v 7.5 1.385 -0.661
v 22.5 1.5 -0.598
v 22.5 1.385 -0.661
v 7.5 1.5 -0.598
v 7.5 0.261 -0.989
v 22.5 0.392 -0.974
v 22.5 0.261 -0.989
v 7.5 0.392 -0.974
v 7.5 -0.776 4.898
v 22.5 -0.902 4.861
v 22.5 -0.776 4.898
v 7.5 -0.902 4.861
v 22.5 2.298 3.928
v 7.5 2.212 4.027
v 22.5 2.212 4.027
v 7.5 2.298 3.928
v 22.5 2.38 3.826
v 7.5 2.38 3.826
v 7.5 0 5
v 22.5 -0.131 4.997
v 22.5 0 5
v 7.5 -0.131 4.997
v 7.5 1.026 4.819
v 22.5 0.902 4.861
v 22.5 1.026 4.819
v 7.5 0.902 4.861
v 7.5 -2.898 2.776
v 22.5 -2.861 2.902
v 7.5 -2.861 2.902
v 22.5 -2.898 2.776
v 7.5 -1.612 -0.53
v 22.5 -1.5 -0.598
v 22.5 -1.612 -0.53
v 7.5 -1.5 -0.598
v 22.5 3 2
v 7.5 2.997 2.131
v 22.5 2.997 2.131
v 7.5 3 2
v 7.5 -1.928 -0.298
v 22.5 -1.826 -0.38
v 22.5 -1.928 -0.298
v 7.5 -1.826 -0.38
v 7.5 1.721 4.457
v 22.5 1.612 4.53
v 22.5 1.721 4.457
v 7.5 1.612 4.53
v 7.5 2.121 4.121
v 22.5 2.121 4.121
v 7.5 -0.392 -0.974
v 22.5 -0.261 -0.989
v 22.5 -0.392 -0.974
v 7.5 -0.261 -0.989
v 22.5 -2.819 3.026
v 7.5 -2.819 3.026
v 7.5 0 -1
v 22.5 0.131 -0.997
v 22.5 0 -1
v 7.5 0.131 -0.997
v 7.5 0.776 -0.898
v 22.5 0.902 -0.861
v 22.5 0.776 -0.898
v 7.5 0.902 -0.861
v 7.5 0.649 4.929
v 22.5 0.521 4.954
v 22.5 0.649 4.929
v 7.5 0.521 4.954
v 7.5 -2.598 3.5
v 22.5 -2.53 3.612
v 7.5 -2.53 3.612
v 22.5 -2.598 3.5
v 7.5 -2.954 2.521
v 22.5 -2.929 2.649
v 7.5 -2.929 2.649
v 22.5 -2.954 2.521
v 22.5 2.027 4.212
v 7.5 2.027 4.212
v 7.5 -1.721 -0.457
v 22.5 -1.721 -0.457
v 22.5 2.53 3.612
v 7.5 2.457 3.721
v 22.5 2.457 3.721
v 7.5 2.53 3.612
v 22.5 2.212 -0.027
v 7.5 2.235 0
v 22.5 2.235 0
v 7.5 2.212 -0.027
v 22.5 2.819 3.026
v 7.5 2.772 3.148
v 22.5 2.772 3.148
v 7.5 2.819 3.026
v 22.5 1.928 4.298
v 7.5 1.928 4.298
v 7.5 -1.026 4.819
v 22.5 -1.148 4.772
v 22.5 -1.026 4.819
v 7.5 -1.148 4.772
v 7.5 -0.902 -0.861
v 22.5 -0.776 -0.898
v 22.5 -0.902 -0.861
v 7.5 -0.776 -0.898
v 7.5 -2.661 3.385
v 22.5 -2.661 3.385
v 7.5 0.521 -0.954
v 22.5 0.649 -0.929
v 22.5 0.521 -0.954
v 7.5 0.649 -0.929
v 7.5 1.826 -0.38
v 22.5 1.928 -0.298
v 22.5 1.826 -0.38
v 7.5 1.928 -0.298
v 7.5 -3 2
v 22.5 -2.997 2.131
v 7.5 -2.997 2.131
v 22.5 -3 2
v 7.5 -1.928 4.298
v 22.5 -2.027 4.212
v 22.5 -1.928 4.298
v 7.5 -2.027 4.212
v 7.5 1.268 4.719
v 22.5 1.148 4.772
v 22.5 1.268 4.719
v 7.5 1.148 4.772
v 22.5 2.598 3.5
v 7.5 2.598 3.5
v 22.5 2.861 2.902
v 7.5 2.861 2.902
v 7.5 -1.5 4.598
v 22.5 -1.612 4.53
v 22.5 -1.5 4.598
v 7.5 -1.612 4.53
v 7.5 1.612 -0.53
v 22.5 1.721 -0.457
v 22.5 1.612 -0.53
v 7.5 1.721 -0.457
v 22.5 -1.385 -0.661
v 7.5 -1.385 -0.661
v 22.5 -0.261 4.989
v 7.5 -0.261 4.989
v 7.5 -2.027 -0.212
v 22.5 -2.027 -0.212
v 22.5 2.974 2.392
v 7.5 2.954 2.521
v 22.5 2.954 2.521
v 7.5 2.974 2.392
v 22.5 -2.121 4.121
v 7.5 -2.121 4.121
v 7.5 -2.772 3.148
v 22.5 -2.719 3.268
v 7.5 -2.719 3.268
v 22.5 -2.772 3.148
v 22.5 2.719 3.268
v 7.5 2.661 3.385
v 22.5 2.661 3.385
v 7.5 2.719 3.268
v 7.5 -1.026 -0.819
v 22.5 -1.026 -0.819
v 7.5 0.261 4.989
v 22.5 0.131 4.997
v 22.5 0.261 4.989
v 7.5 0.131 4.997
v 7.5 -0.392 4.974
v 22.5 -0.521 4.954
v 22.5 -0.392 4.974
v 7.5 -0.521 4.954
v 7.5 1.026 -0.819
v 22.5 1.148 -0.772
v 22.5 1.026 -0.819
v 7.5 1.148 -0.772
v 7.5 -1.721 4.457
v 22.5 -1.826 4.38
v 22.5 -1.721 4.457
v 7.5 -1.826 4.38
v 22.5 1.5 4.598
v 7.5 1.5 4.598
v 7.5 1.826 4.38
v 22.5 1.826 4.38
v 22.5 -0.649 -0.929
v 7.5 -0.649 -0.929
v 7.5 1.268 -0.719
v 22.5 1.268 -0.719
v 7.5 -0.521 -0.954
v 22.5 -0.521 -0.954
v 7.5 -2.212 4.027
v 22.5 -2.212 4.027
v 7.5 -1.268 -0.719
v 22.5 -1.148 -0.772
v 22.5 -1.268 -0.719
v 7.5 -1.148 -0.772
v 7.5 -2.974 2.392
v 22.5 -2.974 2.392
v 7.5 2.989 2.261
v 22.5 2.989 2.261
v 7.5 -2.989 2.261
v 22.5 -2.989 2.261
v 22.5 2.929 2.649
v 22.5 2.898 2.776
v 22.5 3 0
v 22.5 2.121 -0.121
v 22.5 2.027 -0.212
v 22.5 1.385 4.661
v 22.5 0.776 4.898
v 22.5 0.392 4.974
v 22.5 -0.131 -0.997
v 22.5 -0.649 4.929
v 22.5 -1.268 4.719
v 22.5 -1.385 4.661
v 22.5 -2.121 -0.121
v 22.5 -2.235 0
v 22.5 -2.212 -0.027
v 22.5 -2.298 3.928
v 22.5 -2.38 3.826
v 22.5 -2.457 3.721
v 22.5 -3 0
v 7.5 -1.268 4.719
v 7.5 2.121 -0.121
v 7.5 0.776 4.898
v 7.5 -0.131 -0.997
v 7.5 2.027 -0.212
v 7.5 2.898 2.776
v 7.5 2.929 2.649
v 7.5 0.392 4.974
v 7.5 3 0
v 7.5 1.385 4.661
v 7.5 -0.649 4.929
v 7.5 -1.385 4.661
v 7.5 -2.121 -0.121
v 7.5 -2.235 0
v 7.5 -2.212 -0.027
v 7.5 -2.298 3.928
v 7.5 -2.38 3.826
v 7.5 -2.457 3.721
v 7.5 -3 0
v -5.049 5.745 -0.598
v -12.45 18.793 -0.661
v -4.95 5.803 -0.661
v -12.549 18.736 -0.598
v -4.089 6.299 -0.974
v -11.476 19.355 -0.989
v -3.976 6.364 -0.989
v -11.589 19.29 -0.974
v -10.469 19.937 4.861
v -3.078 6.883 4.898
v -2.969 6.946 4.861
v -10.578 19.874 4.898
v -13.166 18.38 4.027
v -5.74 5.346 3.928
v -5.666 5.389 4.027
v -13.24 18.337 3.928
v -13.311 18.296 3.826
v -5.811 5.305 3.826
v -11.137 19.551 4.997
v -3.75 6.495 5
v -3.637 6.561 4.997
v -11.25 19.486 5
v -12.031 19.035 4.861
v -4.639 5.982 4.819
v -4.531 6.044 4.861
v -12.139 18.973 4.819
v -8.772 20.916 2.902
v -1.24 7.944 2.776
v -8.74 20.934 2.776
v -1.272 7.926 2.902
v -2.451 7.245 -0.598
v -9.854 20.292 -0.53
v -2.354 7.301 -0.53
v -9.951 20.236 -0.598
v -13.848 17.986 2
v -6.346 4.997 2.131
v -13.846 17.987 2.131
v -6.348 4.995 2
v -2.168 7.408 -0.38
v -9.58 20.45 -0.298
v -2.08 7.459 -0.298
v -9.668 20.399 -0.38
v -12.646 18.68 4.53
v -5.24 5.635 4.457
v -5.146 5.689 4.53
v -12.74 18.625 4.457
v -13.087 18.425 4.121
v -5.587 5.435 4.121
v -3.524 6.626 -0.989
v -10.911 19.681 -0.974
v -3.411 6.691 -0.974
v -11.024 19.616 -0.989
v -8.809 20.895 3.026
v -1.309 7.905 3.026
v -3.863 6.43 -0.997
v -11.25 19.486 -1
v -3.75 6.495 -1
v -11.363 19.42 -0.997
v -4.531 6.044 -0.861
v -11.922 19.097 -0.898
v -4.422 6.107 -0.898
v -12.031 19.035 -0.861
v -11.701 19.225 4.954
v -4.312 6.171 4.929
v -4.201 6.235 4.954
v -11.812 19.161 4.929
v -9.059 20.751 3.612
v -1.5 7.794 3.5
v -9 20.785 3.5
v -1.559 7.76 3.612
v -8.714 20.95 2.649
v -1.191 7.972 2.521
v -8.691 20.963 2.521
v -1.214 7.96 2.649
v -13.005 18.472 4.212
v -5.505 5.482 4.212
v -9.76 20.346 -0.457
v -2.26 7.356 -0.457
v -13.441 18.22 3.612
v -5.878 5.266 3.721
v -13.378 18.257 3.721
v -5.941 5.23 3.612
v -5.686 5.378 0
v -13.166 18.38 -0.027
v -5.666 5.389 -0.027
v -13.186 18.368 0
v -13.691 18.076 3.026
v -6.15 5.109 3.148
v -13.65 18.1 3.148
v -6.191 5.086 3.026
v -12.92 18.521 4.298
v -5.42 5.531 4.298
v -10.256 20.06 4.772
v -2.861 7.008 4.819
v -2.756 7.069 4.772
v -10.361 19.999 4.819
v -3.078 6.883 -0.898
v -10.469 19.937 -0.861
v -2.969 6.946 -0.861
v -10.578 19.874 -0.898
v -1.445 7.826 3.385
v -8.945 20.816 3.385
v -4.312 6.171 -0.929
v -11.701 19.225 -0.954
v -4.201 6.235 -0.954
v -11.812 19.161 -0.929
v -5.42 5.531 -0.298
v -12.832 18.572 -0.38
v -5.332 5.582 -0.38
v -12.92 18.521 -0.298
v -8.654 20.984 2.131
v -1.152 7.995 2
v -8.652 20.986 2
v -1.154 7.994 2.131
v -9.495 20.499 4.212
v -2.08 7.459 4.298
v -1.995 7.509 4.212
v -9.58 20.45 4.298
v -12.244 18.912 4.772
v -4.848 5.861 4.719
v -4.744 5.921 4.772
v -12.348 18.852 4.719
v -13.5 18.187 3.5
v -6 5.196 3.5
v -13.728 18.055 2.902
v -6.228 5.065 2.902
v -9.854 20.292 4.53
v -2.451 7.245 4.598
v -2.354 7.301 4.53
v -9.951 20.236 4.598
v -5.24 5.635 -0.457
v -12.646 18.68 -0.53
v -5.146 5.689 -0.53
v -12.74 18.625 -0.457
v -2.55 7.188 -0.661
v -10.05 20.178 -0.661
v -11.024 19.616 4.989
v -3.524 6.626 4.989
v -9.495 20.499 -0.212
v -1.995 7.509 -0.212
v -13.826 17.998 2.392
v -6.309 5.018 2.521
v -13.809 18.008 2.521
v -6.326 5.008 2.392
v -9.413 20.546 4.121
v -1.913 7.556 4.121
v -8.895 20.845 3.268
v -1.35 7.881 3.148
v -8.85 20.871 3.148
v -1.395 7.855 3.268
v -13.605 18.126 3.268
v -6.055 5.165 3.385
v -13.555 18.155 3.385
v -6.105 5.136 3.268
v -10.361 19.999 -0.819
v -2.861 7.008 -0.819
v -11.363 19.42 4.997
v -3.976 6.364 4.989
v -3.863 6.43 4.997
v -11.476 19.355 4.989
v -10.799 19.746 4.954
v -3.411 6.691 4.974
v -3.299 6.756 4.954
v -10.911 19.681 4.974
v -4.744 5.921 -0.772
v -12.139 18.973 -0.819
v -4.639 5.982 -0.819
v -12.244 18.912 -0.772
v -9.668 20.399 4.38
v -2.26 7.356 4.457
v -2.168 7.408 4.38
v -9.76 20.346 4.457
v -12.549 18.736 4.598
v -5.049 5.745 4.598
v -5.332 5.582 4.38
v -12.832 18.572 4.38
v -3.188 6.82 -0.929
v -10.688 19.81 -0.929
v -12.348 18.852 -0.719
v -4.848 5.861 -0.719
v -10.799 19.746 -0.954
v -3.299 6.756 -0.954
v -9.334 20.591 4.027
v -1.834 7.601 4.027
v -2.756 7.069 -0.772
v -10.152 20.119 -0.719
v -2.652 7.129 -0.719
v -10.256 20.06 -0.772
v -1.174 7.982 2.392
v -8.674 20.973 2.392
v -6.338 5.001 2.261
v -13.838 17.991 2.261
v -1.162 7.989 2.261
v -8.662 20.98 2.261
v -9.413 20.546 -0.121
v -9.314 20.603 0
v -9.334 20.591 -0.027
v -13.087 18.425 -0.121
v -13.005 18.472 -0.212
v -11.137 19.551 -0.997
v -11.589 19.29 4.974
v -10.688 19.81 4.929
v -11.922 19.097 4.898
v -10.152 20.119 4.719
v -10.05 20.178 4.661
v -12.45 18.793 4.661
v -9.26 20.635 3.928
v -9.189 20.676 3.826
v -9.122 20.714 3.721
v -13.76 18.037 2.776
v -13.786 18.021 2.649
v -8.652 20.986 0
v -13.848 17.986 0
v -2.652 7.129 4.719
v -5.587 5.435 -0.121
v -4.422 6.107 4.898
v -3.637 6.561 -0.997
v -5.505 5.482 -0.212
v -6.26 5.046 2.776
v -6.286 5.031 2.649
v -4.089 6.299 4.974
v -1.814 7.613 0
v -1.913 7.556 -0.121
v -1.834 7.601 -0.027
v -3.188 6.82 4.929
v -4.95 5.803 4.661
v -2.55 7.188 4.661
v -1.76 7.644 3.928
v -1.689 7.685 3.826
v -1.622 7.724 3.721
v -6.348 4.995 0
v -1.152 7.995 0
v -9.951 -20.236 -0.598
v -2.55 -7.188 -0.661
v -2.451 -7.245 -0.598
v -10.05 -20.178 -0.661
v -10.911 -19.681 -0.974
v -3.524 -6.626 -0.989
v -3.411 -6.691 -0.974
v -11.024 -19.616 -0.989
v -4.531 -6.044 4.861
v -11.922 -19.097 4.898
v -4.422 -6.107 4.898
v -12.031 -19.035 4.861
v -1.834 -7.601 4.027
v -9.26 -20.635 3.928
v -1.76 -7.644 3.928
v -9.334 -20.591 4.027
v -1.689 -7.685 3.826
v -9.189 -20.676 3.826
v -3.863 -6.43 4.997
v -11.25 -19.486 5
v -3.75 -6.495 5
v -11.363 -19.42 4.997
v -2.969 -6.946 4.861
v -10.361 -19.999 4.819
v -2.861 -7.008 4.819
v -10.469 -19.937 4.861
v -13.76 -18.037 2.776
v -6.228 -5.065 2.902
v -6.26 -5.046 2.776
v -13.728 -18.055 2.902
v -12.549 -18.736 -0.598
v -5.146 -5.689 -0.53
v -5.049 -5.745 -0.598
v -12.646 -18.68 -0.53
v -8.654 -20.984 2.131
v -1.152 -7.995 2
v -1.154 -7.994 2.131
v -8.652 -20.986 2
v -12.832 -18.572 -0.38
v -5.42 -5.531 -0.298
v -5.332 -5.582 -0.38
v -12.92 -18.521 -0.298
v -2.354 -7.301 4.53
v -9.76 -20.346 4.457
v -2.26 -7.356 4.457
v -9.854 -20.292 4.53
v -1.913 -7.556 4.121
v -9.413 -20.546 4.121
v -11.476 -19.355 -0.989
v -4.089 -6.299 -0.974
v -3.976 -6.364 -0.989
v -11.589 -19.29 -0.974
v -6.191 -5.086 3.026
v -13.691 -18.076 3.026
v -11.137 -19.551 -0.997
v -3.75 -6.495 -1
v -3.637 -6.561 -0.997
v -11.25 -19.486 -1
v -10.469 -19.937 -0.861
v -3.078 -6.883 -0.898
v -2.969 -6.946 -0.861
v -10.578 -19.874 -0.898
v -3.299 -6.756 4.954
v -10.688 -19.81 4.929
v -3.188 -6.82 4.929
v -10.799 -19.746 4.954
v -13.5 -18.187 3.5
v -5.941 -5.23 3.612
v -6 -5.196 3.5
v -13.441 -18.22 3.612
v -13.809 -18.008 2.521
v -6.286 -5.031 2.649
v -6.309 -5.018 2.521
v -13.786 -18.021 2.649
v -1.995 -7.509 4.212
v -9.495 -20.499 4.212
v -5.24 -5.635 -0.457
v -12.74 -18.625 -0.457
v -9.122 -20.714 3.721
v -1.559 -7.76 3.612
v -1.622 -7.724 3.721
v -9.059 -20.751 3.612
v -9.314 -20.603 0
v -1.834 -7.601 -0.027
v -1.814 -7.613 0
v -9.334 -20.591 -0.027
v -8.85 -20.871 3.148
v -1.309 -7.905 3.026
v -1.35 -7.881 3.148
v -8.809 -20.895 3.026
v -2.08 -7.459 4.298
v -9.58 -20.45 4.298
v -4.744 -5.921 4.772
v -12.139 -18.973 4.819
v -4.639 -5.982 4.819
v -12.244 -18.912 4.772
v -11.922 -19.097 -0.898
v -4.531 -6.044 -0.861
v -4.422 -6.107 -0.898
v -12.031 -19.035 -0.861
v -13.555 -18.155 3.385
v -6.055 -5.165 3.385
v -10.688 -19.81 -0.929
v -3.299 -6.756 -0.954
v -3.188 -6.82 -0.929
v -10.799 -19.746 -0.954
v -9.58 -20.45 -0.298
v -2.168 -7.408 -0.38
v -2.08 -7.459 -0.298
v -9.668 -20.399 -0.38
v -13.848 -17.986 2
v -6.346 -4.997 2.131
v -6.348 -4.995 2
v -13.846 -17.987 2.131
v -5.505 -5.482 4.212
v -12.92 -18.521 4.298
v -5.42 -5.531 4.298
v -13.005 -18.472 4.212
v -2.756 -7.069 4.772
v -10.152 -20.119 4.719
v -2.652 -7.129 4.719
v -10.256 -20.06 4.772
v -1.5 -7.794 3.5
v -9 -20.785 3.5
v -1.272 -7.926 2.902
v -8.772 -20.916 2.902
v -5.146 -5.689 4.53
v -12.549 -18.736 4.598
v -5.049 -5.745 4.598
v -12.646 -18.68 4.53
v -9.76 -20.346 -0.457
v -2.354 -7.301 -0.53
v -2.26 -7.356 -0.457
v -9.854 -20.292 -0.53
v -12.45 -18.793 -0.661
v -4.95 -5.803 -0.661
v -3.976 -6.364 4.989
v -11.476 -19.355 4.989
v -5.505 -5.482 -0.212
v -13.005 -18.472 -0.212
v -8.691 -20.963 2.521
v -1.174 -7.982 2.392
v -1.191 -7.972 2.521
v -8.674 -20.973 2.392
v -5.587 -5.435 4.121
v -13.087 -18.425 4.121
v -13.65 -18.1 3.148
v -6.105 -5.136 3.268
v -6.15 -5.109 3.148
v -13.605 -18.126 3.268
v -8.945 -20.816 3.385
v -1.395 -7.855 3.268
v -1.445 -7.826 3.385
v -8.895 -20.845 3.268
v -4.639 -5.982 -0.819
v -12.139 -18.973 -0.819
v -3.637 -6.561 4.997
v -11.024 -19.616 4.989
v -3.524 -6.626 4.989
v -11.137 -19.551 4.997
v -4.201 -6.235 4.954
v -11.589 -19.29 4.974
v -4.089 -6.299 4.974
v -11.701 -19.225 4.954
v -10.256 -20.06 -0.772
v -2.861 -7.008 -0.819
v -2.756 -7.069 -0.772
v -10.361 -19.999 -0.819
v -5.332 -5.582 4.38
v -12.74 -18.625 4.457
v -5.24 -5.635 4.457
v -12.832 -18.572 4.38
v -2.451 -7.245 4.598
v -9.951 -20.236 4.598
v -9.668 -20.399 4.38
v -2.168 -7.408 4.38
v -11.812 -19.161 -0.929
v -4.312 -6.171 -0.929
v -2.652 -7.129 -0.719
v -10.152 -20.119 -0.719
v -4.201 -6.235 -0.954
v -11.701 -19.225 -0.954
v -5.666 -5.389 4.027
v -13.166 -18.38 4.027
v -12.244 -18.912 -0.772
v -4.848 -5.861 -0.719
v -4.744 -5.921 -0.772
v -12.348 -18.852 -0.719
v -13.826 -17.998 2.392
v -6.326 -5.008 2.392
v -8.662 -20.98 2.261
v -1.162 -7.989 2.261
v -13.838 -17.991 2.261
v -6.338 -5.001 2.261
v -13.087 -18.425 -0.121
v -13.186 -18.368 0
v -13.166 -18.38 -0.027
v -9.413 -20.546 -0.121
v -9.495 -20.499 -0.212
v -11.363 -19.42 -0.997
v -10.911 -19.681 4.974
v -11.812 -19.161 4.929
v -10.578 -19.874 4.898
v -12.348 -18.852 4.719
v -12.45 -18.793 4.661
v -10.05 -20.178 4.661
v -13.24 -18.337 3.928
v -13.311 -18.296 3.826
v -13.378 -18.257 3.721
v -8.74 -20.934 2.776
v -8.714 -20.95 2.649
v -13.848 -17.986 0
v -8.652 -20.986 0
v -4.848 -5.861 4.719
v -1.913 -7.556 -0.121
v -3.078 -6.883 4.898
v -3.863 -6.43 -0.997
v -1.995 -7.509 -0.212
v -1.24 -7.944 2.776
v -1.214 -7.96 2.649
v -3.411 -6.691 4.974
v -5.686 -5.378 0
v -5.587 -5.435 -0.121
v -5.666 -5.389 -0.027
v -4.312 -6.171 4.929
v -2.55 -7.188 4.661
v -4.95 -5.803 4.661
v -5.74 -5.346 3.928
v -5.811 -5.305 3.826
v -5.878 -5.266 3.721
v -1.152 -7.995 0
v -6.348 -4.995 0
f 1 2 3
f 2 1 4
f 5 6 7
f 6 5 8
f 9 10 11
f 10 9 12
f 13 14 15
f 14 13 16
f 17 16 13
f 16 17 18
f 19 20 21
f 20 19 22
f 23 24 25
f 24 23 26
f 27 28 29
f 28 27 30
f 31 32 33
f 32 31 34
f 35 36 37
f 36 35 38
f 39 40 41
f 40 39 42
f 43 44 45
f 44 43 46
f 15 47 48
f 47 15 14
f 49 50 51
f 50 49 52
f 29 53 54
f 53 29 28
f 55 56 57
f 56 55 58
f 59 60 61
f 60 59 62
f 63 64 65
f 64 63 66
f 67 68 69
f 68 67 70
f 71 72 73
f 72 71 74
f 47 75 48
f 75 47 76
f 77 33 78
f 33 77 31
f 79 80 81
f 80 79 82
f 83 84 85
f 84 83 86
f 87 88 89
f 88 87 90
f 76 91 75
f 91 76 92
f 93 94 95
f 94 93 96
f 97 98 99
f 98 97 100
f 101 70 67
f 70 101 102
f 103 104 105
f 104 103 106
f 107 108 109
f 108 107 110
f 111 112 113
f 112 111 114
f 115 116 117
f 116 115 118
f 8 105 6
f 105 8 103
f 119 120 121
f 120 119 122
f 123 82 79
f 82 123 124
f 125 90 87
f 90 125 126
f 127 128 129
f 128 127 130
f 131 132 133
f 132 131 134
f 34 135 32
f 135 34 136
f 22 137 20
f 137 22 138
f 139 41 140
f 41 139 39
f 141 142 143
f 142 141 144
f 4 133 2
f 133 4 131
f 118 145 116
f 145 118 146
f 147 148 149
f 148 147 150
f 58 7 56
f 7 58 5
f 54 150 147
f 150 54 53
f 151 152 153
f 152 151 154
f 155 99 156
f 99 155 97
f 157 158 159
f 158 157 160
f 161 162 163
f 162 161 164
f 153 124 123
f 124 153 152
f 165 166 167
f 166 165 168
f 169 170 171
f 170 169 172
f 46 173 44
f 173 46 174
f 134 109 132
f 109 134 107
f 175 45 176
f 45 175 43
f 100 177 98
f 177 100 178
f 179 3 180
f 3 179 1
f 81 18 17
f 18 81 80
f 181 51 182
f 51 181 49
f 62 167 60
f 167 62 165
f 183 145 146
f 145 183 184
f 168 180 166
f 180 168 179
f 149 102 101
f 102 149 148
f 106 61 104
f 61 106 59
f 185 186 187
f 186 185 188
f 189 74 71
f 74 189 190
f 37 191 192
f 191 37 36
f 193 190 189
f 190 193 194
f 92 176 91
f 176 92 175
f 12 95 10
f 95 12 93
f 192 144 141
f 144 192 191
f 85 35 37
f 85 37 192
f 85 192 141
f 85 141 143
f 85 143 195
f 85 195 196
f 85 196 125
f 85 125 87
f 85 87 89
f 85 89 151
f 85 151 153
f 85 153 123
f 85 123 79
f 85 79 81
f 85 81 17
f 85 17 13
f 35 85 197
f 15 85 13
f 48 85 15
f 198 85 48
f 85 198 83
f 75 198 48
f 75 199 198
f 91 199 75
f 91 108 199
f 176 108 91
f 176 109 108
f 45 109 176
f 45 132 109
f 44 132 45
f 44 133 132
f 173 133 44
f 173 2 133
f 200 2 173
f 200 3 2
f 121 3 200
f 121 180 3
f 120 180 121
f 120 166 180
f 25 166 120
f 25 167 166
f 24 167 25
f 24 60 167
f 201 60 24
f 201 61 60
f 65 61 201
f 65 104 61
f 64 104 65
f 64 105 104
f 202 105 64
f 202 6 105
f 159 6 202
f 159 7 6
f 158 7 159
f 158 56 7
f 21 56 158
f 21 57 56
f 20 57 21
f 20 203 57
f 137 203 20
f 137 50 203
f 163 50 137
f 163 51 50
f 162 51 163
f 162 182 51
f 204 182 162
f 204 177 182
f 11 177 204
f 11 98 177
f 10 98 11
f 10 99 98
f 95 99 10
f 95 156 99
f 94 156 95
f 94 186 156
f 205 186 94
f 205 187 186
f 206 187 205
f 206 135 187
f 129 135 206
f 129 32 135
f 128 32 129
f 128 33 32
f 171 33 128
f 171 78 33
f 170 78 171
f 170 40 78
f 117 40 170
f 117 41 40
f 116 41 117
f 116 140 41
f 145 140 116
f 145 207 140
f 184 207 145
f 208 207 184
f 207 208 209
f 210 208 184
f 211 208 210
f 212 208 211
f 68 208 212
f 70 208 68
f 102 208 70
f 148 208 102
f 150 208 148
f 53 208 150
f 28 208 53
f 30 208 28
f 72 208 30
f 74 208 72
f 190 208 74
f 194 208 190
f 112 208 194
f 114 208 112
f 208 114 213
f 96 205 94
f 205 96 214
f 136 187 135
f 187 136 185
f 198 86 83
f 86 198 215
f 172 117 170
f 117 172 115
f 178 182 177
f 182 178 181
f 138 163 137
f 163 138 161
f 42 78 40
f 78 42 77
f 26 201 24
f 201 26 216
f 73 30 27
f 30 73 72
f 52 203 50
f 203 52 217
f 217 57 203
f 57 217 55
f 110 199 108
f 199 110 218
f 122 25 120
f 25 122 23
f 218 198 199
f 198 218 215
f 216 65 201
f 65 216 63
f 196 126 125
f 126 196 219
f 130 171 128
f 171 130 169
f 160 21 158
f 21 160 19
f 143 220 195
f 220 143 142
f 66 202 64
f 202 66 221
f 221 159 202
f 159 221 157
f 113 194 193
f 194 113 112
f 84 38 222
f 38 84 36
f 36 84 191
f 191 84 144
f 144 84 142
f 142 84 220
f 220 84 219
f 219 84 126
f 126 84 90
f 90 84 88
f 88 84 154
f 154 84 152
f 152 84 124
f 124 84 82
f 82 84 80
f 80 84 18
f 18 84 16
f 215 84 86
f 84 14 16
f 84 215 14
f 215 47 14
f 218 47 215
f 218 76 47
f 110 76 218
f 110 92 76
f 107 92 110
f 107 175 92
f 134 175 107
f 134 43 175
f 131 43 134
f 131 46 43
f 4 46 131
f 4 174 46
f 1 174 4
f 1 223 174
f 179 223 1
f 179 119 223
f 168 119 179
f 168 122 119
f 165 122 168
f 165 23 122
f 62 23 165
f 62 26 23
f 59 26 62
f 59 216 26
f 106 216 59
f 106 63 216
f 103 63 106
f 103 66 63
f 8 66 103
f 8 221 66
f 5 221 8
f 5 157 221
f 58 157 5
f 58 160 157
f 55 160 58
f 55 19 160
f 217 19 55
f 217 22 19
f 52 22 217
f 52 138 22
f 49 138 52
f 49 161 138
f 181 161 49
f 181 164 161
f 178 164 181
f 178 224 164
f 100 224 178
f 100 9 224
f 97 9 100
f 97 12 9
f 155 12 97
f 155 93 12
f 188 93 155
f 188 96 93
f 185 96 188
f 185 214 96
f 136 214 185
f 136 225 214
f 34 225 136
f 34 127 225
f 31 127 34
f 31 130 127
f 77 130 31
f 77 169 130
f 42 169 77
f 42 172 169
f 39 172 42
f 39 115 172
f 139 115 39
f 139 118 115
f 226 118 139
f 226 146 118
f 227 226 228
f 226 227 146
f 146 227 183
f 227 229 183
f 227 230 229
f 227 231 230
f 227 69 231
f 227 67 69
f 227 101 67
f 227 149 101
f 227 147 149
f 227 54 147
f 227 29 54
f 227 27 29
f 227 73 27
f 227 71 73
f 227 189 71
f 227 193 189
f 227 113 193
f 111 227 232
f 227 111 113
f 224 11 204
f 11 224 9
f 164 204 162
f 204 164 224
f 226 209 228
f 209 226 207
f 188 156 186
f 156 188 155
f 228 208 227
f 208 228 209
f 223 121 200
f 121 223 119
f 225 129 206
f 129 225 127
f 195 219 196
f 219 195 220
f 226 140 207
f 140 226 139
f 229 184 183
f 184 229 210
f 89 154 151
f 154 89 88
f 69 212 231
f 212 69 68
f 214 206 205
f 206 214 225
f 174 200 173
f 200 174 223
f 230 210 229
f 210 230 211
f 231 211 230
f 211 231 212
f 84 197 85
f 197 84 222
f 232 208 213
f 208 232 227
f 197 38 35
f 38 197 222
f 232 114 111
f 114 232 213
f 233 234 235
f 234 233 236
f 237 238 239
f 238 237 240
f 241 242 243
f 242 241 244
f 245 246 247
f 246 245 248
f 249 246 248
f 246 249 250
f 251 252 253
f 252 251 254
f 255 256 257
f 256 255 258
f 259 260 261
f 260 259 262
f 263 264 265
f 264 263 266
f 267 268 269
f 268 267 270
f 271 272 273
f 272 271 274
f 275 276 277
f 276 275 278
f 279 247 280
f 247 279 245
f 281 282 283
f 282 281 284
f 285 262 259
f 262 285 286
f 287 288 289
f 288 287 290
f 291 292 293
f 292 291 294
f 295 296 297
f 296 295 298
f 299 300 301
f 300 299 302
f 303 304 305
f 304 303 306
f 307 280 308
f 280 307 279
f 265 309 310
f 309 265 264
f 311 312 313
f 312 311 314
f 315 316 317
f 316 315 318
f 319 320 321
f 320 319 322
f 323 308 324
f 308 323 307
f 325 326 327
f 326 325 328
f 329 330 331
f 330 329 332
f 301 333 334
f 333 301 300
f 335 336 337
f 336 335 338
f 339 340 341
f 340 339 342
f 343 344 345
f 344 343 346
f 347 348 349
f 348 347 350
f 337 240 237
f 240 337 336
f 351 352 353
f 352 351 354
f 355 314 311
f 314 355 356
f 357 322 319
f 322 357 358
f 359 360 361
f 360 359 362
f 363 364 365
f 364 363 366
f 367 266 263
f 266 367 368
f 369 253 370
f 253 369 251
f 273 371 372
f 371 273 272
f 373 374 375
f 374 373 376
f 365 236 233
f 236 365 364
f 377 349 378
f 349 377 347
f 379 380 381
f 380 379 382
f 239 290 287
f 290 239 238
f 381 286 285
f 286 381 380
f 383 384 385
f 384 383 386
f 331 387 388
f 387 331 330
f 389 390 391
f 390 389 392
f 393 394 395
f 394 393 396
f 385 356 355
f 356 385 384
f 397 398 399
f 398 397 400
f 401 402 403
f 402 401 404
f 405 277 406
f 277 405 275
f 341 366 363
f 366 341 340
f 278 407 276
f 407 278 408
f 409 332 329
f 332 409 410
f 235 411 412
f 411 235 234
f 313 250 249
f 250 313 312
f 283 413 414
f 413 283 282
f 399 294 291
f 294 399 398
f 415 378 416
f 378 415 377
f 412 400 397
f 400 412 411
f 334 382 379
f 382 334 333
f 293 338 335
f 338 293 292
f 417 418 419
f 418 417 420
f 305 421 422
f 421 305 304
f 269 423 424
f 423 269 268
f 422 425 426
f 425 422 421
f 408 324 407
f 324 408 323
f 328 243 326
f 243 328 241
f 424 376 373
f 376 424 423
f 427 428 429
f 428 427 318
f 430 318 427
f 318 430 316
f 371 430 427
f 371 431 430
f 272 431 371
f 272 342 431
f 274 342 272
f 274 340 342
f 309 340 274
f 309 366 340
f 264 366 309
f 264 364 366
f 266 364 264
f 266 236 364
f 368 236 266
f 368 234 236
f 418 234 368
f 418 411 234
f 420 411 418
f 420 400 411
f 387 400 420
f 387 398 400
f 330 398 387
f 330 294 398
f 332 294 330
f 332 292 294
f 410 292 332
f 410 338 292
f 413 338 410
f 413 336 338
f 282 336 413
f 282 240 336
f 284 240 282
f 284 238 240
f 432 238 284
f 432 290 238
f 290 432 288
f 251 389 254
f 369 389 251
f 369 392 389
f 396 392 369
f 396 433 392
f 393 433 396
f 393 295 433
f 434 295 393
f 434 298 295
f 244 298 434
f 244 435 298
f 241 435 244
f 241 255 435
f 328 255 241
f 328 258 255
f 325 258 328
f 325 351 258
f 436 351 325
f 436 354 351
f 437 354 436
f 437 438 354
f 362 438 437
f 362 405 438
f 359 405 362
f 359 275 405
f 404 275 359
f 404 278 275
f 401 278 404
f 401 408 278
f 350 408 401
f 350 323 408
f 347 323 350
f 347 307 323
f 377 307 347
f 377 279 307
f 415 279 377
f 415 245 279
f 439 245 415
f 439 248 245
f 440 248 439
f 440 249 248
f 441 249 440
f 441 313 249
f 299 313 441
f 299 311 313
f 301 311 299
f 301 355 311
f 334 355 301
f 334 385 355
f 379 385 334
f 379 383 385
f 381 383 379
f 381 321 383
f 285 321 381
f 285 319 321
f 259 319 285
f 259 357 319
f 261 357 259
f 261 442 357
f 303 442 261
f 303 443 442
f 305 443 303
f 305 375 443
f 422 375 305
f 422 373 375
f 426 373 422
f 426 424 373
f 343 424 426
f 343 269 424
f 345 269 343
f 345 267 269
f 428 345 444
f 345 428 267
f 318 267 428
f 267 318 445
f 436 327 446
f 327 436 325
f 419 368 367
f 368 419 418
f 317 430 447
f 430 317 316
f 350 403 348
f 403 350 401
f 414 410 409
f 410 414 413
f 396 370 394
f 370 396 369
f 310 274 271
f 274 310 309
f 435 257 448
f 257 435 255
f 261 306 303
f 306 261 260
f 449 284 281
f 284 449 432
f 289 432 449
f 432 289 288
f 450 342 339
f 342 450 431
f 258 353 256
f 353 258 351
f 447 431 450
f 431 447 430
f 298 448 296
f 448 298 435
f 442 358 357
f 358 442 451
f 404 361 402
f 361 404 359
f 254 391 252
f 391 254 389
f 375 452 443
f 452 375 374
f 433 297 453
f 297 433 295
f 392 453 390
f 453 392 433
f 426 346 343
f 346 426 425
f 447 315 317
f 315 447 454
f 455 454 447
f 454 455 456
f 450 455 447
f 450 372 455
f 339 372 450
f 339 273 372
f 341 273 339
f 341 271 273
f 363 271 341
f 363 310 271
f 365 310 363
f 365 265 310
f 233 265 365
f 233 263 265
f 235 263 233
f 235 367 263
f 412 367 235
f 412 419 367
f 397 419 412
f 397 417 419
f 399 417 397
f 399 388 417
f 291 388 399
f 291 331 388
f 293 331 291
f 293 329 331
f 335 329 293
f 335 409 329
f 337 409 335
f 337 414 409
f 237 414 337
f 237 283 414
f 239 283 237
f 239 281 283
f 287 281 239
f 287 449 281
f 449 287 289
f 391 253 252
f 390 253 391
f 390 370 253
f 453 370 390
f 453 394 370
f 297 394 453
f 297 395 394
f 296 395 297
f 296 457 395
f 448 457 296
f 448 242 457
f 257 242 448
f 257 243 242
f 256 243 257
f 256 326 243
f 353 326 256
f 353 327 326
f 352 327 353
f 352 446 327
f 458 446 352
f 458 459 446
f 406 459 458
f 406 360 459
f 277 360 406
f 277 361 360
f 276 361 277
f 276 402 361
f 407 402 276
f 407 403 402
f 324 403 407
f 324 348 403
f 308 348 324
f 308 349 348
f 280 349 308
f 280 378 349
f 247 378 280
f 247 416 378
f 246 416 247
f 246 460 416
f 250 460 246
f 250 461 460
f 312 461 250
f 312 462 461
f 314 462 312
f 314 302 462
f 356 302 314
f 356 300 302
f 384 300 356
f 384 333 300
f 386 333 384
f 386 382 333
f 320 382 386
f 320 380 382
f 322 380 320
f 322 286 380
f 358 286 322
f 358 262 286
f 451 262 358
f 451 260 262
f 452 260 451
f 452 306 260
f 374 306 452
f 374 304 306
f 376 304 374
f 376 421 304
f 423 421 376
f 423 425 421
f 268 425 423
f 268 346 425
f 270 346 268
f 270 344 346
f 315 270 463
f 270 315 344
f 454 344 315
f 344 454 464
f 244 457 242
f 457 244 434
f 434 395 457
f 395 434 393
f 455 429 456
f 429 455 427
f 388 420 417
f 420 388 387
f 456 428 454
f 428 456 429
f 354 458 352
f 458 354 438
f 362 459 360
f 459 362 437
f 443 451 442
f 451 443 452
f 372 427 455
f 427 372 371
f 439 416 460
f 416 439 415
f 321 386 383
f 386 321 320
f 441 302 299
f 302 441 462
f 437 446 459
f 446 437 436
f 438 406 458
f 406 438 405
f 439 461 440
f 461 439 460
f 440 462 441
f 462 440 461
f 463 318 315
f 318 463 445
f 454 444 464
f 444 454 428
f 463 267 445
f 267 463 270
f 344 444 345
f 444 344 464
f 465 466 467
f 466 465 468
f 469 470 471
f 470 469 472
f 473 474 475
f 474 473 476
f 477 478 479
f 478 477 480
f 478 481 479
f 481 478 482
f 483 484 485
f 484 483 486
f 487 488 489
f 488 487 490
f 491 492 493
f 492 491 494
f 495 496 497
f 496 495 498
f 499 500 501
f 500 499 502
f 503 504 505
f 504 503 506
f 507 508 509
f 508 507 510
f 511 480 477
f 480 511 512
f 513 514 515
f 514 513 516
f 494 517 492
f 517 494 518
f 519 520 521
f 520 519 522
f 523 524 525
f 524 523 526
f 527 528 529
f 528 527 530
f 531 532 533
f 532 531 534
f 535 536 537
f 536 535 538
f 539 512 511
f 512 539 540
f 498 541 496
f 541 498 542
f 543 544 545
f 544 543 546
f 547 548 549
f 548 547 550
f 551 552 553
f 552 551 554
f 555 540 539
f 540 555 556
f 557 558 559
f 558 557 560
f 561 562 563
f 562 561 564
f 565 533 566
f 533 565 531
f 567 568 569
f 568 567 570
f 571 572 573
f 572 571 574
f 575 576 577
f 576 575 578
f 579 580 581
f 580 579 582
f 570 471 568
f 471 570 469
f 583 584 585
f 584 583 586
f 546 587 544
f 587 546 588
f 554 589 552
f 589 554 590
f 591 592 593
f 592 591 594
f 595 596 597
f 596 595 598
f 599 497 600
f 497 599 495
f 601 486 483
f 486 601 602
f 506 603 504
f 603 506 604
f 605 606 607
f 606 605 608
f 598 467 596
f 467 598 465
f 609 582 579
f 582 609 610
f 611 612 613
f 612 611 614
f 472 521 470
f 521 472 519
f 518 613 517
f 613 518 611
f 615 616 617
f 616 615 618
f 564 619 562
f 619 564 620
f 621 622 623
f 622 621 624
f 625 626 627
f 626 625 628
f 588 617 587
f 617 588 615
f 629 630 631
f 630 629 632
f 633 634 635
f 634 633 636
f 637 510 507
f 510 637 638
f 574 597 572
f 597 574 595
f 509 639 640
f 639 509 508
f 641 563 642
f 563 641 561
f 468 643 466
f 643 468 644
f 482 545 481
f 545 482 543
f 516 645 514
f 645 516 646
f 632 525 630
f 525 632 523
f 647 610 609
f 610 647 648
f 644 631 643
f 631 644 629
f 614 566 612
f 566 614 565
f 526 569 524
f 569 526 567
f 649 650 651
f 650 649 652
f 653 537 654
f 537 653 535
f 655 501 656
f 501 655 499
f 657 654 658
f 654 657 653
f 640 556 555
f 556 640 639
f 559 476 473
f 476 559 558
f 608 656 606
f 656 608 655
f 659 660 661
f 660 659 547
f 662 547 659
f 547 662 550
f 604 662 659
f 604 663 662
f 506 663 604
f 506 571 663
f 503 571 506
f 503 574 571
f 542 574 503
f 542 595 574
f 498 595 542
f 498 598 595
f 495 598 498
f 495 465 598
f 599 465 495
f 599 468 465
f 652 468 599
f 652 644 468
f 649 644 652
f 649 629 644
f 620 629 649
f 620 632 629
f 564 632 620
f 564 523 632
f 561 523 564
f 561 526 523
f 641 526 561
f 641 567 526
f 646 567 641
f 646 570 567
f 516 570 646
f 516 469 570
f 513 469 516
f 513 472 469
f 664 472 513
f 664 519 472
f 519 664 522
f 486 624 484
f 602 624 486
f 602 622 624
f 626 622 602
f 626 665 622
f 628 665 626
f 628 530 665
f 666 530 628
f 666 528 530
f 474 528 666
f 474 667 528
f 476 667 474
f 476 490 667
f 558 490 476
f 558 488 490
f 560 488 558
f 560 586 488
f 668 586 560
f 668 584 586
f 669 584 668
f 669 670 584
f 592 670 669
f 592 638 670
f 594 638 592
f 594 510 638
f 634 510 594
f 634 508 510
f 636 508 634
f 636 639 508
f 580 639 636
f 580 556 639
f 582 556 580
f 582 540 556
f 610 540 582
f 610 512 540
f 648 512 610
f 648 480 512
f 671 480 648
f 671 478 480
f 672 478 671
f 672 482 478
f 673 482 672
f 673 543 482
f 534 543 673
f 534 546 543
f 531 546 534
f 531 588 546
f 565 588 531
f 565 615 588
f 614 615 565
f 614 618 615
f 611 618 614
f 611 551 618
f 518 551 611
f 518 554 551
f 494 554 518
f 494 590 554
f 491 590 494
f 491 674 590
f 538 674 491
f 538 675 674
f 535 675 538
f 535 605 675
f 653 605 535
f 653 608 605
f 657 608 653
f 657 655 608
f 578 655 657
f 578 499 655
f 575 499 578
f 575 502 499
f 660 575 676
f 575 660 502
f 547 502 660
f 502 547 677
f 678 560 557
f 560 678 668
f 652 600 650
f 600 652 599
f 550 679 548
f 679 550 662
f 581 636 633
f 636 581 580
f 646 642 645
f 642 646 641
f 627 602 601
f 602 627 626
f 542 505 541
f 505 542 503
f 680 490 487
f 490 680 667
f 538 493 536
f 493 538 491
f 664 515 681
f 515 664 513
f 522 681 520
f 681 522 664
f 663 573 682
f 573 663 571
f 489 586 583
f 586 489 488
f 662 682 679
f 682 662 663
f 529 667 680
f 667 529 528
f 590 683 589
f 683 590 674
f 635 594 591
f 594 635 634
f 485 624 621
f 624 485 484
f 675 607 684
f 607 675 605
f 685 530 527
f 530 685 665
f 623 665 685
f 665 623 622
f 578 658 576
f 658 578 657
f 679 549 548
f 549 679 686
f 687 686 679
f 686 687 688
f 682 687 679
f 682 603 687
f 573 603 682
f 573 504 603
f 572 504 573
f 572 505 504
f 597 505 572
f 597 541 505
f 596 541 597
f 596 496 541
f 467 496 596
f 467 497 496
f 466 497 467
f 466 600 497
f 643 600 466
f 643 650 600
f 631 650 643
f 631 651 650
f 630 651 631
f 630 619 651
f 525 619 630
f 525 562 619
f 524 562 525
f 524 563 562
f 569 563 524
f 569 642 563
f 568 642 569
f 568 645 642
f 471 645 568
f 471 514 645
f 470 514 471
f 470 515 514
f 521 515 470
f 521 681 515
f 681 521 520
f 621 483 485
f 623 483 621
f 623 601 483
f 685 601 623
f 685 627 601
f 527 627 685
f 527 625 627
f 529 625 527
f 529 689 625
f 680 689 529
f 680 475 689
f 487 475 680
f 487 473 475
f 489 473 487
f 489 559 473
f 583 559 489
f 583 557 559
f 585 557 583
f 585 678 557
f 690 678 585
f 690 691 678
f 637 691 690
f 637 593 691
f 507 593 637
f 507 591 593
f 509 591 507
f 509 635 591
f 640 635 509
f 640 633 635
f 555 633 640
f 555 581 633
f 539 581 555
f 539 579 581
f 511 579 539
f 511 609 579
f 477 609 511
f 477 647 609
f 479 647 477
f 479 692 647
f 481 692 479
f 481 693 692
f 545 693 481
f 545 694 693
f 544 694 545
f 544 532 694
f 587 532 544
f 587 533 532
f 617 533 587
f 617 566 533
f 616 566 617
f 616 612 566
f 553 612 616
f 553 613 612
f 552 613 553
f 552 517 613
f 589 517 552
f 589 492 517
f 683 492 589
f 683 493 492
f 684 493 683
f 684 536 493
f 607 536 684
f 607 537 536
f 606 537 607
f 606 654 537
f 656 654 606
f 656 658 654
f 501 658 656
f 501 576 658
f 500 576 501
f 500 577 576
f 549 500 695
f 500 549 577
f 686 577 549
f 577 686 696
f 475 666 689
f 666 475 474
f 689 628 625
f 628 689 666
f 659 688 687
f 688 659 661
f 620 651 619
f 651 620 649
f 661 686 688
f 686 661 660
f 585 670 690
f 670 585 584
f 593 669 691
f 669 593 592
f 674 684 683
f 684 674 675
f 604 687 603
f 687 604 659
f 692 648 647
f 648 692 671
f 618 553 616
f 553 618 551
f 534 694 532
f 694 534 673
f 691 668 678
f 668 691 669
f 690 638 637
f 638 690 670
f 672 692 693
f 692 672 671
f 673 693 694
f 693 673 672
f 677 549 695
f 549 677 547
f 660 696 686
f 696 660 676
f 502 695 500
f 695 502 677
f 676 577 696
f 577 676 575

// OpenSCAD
// file: ../c3d_params.scad
$fn=144;

nozzle = 0.4;

base_radius = 10;
base_thickness = 1.2;
base_segment_length = 20;
base_segment_width = 5;
base_tile_side = nozzle+base_segment_length+2*base_radius;
// main file
include <../c3d_params.scad>;

module settlement() {
 r = base_radius;
 r2 = .875*r;
 h1 = base_radius;
 h2 = .85*base_radius;
 cylinder(h=base_thickness,r=r);
 translate([0,0,base_thickness]) difference() {
   cylinder(h=h1-base_thickness,r=.75*r);
   for (i = [0:2]) {
     rotate([0,0,i*120]) translate([.75*r-2,-2.5,-2]) cube([2,5,6]);
   }
 }
 translate([0,0,h1]) {
   cylinder(r=r2,h=2);
   translate([0,0,2]) difference() {
     cylinder(h=h2,r1=r2,r2=0);
     translate([0,0,h2-1]) cylinder(h=6,r=2);
   }
 }
}

for (i = [0:2]) {
  rotate([0,0,i*120]) translate([.75*base_radius,0,0]) {
    translate([0,0,2]) rotate([0,90,0]) cylinder(r=3,h=1.5*base_radius);
    translate([0,-3,0]) cube([1.5*base_radius,6,2]);
  }
}
